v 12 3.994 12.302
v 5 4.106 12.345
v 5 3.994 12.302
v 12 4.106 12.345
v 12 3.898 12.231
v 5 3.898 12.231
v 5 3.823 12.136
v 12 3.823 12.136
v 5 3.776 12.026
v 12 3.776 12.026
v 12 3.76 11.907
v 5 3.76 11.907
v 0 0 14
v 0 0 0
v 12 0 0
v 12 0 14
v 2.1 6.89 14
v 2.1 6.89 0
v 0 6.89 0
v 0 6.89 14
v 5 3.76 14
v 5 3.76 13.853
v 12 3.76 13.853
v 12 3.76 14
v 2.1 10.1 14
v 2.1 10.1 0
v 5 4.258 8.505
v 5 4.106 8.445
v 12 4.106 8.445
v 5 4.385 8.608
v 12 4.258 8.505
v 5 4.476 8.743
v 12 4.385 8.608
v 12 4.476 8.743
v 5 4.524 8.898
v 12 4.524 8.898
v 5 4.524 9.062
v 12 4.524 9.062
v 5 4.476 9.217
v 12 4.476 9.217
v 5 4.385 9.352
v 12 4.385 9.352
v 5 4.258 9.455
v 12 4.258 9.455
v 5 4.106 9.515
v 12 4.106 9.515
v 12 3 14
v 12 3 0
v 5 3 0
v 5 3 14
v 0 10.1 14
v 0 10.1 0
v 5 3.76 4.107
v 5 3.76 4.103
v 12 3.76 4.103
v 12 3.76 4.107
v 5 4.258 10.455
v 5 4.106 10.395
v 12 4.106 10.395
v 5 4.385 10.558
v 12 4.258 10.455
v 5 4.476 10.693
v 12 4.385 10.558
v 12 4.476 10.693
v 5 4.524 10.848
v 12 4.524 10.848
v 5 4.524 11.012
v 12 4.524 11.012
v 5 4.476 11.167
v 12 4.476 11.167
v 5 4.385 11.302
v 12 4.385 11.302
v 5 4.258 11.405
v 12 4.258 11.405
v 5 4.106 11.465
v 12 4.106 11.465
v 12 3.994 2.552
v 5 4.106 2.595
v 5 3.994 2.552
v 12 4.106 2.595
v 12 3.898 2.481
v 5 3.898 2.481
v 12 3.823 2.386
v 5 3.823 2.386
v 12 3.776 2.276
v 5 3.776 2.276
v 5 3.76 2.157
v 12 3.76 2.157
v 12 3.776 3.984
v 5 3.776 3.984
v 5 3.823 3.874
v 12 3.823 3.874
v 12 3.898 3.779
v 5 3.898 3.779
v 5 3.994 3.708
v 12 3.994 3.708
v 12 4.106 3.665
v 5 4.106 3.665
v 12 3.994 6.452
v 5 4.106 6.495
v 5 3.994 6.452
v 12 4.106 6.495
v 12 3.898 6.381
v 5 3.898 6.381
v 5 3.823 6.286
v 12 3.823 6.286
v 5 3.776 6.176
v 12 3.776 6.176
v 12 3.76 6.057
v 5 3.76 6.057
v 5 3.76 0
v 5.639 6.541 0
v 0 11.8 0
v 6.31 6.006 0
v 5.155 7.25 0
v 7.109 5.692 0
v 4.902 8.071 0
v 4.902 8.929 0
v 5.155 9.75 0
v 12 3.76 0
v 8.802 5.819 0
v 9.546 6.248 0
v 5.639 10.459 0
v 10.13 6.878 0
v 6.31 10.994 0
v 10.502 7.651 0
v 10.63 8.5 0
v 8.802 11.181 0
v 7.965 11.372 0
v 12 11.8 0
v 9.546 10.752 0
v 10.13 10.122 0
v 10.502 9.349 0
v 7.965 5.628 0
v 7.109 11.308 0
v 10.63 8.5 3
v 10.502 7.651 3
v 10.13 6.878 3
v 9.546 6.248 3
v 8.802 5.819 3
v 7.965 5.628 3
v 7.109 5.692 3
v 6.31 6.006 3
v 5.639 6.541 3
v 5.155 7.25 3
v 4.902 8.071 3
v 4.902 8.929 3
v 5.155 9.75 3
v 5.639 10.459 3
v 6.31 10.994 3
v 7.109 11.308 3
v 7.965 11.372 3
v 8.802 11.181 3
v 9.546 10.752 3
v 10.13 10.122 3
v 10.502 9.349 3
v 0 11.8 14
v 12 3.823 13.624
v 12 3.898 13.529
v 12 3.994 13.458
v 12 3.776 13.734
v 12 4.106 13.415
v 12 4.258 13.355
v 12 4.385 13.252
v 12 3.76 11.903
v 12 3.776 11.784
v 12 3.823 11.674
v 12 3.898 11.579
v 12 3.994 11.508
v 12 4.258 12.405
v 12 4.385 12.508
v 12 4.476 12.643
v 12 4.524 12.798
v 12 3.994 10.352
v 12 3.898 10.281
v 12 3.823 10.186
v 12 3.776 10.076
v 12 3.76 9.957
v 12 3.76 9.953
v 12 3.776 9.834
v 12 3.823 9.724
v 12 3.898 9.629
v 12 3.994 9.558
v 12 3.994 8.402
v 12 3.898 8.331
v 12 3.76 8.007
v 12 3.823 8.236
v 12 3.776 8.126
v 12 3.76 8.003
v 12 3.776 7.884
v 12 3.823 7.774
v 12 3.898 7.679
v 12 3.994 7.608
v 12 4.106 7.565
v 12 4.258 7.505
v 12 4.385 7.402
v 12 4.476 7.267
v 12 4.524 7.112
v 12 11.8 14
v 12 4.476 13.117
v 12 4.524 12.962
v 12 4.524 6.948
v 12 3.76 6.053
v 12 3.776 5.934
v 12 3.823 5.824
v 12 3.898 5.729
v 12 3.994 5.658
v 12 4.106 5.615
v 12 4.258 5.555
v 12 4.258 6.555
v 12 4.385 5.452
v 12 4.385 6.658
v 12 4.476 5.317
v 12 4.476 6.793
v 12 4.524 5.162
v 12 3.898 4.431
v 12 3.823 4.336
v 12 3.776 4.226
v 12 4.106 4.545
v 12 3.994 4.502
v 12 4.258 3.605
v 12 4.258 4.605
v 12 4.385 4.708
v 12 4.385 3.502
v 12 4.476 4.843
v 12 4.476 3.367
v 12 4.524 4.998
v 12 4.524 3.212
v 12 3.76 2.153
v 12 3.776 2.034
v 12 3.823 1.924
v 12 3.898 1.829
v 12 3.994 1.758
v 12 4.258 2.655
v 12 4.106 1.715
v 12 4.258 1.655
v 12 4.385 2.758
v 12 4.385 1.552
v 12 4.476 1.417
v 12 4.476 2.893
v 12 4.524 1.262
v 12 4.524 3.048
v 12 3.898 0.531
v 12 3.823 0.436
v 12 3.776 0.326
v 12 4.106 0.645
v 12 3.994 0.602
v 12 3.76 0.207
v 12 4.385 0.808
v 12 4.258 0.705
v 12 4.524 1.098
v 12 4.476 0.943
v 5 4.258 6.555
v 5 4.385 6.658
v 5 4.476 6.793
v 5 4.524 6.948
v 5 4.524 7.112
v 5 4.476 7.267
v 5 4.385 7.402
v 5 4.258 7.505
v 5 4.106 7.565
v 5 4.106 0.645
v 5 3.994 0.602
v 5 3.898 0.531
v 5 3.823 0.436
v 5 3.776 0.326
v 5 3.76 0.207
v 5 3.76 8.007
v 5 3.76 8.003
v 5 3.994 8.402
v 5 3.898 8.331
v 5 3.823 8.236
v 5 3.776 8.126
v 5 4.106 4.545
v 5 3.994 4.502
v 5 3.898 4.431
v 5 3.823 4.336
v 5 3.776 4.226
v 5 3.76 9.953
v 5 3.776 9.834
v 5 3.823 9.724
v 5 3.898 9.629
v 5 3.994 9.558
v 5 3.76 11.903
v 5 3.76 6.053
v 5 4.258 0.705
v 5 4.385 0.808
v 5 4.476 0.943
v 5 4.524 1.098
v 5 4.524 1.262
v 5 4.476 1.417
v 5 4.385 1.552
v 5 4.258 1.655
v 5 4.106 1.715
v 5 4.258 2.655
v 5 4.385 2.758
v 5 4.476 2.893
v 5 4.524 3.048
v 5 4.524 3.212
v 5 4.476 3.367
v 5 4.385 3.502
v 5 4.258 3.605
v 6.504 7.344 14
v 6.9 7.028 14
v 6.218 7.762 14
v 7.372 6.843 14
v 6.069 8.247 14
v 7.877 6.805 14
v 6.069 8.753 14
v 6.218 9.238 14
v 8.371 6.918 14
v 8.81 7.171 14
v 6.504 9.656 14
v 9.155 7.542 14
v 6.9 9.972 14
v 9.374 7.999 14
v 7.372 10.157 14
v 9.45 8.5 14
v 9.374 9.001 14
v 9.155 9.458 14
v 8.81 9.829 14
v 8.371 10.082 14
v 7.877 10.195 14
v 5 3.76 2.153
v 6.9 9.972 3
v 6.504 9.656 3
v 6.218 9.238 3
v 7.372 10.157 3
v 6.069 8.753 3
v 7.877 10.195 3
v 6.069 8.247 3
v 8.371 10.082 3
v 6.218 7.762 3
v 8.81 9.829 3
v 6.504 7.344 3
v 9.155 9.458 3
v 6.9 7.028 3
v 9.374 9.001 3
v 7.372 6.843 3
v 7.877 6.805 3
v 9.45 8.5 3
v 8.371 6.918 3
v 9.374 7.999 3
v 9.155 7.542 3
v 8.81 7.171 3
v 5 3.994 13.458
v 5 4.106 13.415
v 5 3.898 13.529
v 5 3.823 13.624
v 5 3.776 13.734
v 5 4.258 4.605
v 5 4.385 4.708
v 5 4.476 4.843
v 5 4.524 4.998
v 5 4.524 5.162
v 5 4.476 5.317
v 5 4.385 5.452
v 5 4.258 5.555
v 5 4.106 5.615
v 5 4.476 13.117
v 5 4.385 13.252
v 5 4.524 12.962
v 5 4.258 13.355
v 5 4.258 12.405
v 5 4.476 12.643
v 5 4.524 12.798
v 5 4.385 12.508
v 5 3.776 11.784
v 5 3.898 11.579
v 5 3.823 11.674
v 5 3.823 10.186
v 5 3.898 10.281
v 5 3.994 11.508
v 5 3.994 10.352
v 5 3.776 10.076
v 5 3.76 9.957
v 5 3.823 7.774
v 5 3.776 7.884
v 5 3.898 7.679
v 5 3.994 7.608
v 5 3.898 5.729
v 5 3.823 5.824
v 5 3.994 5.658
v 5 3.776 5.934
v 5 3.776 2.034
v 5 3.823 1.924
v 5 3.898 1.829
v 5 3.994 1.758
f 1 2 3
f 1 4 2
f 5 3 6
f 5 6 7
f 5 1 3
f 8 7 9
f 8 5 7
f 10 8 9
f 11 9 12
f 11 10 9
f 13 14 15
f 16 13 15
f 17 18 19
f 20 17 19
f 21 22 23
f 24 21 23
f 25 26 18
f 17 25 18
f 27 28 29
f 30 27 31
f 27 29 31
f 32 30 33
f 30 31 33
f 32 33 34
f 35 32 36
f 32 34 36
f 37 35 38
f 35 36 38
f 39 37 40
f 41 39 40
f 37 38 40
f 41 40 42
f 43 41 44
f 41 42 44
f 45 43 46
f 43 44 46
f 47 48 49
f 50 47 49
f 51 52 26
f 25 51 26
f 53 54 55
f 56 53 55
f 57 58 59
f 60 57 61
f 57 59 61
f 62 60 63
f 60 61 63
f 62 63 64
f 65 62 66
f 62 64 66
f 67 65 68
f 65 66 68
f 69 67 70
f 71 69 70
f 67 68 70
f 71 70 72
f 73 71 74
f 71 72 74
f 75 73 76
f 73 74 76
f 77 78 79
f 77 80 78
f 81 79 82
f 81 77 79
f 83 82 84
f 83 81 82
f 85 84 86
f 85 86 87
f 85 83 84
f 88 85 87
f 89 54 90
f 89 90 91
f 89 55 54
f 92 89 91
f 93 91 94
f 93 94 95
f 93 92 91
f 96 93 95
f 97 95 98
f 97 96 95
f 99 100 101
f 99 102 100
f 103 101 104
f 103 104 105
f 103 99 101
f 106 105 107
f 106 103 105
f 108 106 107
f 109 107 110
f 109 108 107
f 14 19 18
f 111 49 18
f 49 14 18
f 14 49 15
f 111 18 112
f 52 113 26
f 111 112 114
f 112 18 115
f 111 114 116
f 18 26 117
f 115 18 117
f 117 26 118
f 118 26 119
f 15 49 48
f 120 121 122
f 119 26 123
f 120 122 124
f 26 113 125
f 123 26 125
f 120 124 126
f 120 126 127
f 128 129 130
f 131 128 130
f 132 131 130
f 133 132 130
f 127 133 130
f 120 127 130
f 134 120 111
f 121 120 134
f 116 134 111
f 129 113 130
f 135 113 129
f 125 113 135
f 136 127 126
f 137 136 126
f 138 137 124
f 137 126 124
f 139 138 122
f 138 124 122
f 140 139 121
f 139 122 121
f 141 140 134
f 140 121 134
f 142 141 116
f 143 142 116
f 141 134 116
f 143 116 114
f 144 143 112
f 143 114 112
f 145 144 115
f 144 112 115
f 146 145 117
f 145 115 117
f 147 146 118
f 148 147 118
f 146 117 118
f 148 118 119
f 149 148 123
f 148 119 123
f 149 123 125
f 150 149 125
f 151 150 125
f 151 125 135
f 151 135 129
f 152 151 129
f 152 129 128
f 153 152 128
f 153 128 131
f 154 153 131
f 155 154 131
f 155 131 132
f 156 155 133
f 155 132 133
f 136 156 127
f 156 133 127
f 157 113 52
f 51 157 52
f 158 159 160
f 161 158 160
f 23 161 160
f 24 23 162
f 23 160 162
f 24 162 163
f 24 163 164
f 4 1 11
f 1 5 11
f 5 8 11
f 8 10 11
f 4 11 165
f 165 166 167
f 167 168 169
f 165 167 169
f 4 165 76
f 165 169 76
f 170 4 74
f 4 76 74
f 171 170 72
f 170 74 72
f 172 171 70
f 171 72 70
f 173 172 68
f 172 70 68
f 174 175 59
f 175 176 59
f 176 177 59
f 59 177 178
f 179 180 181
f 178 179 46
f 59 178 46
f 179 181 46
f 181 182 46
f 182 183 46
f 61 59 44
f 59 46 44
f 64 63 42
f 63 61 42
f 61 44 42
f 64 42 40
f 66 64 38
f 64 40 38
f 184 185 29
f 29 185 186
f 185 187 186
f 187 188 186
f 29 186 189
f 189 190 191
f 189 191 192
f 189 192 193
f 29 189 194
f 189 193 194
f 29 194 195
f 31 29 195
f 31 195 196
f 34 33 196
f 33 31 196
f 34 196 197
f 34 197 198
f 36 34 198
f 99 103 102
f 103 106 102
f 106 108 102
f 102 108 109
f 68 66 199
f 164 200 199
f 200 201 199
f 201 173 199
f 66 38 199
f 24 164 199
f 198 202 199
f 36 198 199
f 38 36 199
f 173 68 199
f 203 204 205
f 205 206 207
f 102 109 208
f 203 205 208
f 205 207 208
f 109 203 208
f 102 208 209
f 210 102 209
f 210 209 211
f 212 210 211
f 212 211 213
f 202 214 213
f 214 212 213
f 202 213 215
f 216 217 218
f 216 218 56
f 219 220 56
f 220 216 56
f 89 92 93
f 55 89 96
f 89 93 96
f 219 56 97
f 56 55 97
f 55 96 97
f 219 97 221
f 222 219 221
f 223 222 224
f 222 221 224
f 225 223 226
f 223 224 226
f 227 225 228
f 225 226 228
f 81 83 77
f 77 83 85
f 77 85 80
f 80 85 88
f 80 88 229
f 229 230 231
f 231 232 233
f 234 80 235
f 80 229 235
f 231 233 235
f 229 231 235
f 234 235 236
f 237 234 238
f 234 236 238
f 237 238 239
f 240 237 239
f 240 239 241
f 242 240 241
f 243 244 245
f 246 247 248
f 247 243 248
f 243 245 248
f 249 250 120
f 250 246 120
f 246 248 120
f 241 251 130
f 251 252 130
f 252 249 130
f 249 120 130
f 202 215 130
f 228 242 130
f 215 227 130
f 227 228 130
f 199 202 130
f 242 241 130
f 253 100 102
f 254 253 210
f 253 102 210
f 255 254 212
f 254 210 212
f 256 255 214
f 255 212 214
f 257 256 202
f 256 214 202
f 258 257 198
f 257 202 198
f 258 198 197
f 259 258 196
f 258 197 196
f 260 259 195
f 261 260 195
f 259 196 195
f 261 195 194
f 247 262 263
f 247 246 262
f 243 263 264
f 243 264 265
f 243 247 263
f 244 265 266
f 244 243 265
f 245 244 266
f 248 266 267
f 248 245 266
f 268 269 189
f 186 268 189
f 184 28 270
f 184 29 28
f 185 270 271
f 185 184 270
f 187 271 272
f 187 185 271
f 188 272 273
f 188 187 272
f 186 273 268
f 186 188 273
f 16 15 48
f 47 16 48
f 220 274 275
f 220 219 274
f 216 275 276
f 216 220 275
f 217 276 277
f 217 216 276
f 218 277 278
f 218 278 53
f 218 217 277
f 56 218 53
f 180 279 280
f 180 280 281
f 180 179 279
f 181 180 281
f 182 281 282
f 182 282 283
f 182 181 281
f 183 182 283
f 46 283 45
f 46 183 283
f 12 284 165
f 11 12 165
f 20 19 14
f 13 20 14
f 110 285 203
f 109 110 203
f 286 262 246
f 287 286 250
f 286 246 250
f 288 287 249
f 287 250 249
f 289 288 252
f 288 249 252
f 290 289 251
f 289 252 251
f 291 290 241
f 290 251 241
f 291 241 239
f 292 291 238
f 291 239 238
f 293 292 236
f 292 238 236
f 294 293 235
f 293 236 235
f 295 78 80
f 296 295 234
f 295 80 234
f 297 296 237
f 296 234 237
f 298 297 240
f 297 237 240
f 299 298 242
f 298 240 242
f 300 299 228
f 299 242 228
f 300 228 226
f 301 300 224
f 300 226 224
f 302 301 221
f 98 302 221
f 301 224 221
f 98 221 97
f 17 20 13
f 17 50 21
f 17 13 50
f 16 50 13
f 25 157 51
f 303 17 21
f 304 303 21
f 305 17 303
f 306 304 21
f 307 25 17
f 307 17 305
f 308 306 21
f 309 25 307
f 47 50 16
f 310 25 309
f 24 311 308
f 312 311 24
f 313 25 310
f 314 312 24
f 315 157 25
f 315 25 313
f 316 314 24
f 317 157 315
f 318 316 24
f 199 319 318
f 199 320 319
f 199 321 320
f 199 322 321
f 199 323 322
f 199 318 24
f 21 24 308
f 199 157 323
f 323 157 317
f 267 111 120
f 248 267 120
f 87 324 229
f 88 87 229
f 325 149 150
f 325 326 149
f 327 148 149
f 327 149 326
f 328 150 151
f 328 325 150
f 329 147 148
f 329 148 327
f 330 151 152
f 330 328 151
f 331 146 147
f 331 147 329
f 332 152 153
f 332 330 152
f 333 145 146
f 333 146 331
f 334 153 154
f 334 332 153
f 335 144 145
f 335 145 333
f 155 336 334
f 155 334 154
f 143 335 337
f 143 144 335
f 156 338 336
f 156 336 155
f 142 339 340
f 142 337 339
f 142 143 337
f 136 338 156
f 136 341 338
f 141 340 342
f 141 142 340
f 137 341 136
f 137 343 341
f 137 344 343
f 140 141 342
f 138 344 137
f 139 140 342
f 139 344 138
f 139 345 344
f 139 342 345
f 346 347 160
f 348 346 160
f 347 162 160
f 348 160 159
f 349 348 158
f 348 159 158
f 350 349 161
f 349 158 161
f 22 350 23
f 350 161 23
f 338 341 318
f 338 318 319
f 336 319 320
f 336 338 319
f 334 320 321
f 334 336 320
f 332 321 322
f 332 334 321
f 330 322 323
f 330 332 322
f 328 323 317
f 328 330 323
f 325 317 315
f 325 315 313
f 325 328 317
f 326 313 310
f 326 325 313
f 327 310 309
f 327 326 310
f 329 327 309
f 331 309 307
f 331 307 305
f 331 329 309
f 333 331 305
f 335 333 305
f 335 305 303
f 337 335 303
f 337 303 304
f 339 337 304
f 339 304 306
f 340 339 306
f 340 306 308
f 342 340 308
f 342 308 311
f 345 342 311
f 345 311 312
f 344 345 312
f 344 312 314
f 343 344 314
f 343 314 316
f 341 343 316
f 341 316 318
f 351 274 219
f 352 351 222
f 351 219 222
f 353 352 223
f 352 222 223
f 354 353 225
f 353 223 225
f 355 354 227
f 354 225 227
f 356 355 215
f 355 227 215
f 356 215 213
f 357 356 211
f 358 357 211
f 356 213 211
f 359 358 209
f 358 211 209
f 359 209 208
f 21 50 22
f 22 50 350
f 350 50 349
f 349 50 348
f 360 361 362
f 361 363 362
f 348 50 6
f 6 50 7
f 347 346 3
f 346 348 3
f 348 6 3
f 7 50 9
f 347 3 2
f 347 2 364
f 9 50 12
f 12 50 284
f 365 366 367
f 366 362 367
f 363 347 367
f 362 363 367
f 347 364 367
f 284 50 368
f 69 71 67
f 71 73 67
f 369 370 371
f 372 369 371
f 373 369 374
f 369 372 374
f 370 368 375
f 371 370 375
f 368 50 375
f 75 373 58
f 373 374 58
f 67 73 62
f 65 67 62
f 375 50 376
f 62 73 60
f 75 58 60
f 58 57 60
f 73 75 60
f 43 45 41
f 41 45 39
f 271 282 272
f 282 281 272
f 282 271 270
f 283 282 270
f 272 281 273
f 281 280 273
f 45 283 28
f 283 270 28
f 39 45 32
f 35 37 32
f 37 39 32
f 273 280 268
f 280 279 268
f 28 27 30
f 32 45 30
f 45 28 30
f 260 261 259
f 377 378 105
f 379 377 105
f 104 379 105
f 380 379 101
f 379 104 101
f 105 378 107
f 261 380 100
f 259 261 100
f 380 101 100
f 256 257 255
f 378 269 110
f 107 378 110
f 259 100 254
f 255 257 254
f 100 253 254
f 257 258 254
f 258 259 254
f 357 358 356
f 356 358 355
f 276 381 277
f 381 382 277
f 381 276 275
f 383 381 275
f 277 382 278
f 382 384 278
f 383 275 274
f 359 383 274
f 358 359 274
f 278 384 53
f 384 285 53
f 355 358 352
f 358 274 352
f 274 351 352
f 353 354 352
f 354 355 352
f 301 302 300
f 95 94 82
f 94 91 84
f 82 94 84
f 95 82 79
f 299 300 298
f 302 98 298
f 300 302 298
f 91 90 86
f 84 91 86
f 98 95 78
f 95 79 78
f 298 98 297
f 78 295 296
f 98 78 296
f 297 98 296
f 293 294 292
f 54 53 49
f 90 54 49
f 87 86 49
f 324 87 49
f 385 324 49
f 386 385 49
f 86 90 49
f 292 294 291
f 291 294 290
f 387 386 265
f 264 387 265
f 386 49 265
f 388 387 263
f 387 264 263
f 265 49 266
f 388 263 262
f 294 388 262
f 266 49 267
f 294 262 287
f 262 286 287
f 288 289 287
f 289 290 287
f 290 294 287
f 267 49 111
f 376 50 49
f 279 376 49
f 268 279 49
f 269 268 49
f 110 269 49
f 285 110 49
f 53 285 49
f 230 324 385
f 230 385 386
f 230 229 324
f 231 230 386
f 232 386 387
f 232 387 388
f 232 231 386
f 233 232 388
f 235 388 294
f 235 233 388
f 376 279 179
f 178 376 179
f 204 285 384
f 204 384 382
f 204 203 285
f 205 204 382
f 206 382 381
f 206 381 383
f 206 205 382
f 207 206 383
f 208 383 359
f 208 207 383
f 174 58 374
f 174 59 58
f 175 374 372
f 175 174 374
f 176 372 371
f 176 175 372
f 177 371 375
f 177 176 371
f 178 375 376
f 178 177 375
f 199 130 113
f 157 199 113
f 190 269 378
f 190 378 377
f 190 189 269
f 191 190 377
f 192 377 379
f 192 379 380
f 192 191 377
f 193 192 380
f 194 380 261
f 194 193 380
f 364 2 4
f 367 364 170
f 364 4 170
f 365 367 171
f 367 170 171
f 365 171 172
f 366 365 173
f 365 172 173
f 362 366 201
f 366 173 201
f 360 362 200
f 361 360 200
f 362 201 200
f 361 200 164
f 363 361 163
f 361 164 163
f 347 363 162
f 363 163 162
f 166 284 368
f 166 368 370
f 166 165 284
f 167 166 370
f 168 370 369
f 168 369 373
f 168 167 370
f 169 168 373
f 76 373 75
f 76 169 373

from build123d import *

# Parameters (mm, degrees)
F0_R     = 1.7
F1_DEPTH = 14
F2_R     = 2.88
F2_R_2   = 1.7
F3_DEPTH = 3
F4_R     = 0.55
F5_DEPTH = 7
F6_R     = 0.45


with BuildPart() as f1:
    # F0 (on Top) → F1 (new body)
    with BuildSketch(Plane.XY):
        Polygon((0, 6.89), (0, 0), (12, 0), (12, 3), (5, 3), (5, 3.76), (12, 3.76), (12, 11.8), (0, 11.8), (0, 10.1), (2.1, 10.1), (2.1, 6.89), align=None)
        with Locations((7.75, 8.5)):
            Circle(F0_R, mode=Mode.SUBTRACT)
    extrude(amount=F1_DEPTH)

    # F2 (on face) → F3 (cut)
    with BuildSketch(Plane(origin=(0, 0, 0), x_dir=(1, 0, 0), z_dir=(0, 0, -1))):
        with Locations((7.75, -8.5)):
            Circle(F2_R)
        with Locations((7.75, -8.5)):
            Circle(F2_R_2, mode=Mode.SUBTRACT)
    extrude(amount=-F3_DEPTH, mode=Mode.SUBTRACT)

    # F4 (on face) → F5 (cut, through all)
    with BuildSketch(Plane.YZ.offset(12)):
        with Locations((3.98, 12.88)):
            Circle(F4_R)
        with Locations((3.98, 10.93)):
            Circle(F4_R)
        with Locations((3.98, 8.98)):
            Circle(F4_R)
        with Locations((3.98, 7.03)):
            Circle(F4_R)
        with Locations((3.98, 5.08)):
            Circle(F4_R)
        with Locations((3.98, 3.13)):
            Circle(F4_R)
        with Locations((3.98, 1.18)):
            Circle(F4_R)
    extrude(amount=-F5_DEPTH, mode=Mode.SUBTRACT)

    # F6
    f6_edges = [f1.edges().sort_by_distance(p)[0] for p in [
        (8.5, 3.76, 12.375917),
        (8.5, 3.76, 13.384083),
        (8.5, 3.76, 11.434083),
        (8.5, 3.76, 10.425917),
        (8.5, 3.76, 9.484083),
        (8.5, 3.76, 8.475917),
        (8.5, 3.76, 7.534083),
        (8.5, 3.76, 6.525917),
        (8.5, 3.76, 5.584083),
        (8.5, 3.76, 4.575917),
        (8.5, 3.76, 3.634083),
        (8.5, 3.76, 2.625917),
        (8.5, 3.76, 1.684083),
        (8.5, 3.76, 0.675917),
    ]]
    fillet(f6_edges, radius=F6_R)


solid = f1.part
